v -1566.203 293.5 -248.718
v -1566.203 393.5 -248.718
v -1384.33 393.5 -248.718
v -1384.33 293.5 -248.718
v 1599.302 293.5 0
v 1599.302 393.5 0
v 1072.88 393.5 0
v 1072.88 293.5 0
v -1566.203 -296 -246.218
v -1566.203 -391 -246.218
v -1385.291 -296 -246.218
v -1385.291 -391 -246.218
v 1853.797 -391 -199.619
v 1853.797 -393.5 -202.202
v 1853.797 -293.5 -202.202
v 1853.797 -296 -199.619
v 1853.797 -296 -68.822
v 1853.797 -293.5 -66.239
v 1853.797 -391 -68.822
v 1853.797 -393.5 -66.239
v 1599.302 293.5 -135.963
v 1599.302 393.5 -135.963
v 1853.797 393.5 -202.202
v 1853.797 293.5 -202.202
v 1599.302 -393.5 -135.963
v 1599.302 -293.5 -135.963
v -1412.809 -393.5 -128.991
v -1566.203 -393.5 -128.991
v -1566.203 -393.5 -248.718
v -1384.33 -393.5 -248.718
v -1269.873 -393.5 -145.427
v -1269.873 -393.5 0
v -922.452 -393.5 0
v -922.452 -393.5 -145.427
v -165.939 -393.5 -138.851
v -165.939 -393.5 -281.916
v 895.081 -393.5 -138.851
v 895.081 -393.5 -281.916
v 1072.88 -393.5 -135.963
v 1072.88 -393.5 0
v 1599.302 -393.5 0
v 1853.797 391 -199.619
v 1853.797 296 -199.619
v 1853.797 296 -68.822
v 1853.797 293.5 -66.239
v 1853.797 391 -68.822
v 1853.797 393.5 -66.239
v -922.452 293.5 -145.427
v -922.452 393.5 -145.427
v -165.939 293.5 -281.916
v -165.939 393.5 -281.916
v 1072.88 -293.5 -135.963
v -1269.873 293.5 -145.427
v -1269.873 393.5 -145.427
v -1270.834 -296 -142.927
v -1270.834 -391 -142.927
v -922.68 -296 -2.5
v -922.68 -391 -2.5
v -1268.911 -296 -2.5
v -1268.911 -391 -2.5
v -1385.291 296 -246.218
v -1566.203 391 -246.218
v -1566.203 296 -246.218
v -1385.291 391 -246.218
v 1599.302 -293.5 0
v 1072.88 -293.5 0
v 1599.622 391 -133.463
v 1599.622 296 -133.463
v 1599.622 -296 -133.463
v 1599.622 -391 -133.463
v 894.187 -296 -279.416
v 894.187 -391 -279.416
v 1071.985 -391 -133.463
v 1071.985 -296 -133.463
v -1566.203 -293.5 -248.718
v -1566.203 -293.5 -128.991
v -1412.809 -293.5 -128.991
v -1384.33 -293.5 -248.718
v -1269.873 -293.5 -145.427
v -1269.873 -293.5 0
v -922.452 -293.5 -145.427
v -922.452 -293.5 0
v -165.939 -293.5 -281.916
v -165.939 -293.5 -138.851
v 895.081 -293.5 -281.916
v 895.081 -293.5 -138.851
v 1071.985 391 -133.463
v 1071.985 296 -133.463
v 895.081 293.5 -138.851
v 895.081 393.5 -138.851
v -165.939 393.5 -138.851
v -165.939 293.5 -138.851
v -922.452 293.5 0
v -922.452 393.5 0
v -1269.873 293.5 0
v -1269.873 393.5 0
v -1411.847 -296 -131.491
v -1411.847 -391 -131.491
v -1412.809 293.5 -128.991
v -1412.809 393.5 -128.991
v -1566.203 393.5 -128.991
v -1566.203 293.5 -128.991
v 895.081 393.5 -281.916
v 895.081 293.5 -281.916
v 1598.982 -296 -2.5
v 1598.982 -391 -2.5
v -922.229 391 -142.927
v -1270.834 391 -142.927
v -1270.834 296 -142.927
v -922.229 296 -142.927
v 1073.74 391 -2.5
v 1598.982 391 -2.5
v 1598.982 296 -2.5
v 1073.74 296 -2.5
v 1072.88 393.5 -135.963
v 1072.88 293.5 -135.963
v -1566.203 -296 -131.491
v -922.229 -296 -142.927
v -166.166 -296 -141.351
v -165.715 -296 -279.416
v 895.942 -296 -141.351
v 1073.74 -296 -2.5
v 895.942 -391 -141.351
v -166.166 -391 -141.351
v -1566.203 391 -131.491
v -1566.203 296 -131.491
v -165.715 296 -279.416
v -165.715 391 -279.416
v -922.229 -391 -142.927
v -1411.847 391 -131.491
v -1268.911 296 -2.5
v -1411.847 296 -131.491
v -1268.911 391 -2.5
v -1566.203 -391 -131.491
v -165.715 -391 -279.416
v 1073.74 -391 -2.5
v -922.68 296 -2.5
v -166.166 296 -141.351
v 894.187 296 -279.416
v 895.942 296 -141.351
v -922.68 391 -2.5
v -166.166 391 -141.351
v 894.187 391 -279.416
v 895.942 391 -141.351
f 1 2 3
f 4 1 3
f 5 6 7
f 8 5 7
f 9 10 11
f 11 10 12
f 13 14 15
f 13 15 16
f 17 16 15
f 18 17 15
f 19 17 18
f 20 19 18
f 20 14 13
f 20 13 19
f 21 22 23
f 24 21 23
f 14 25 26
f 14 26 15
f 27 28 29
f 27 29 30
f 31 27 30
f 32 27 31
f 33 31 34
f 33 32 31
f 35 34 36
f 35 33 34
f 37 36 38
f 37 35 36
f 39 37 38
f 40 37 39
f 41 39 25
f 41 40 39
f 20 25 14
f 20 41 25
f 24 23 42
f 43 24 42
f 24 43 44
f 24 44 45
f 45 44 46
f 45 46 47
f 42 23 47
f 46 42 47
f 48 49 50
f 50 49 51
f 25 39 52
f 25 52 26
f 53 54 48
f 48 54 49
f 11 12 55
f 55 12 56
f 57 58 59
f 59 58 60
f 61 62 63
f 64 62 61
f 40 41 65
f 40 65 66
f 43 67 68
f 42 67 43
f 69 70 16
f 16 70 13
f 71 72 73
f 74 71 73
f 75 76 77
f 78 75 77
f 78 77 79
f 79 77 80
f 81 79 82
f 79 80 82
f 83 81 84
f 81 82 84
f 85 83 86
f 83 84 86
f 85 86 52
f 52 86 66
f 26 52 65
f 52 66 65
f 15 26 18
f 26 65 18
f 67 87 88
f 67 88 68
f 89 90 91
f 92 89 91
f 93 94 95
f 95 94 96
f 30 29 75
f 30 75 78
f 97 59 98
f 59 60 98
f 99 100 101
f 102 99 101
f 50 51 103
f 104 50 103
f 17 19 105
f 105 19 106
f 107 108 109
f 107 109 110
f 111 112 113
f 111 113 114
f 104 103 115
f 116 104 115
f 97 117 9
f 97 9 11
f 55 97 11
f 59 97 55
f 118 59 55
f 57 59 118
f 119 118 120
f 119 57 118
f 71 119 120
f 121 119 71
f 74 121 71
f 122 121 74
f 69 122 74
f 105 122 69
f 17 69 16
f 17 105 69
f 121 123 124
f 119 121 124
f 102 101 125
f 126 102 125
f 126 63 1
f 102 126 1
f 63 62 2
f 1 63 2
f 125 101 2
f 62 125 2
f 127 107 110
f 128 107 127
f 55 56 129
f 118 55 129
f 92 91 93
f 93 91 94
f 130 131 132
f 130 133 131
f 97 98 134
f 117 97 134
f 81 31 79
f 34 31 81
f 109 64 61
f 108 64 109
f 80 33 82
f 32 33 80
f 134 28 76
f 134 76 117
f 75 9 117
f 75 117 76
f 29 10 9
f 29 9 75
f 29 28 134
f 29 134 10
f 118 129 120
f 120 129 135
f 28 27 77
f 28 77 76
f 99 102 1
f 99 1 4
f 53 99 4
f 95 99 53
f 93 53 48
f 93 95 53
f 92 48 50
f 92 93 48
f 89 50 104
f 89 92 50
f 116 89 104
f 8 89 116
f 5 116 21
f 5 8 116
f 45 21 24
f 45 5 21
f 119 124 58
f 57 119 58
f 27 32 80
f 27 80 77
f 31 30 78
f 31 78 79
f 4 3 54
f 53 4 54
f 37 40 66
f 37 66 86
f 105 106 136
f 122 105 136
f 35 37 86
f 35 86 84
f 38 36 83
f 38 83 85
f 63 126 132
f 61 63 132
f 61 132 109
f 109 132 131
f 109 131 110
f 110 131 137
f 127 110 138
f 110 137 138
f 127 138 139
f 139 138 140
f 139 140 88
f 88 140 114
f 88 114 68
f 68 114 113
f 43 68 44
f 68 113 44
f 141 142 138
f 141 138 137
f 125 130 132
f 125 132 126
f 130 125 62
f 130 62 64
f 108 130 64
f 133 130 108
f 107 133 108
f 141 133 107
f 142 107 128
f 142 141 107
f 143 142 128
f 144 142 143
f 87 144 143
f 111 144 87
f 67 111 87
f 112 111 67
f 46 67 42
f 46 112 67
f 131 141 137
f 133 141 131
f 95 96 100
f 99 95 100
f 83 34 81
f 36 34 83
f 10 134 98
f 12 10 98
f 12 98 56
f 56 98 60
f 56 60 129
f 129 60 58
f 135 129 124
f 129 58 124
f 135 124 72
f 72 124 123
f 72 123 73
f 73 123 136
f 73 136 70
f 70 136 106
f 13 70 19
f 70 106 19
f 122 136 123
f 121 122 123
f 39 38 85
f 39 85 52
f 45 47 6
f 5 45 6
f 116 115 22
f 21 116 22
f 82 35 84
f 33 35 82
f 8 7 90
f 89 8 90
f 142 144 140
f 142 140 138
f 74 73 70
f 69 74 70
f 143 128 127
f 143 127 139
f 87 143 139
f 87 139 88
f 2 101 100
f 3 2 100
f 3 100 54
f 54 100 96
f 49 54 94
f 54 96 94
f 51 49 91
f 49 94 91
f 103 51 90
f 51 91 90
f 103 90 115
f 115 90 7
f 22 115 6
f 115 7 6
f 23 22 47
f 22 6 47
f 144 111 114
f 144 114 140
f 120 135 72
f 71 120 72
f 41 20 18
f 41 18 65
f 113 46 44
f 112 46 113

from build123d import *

# Parameters (mm, degrees)
F2_DEPTH = 100
F3_T     = -2.5


with BuildPart() as f2:
    # F1 (on offset) → F2 (new body)
    with BuildSketch(Plane.XZ.offset(393.5)):
        Polygon((-1412.8086419196, -128.9908189169), (-1566.2030417423, -128.9908189169), (-1566.2030417423, -248.7181238432), (-1384.3301761846, -248.7181238432), (-1269.8727268362, -145.4273580902), (-922.4524051726, -145.4273580902), (-165.9386103739, -281.9161423003), (895.0813985169, -281.9161423003), (1072.8795650266, -135.9633091626), (1599.3015918366, -135.9633091626), (1853.7969582577, -202.2018350482), (1853.7969582577, -66.2385258856), (1599.3015918366, 0), (1072.8795650266, 0), (895.0813985169, -138.8513897236), (-165.9386103739, -138.8513897236), (-922.4524051726, 0), (-1269.8727268362, 0), align=None)
    extrude(amount=-F2_DEPTH)

    # F3
    f3_openings = [f2.faces().sort_by_distance(p)[0] for p in [
        (-1566.203042, -343.5, -188.854471),
        (1853.796958, -343.5, -134.22018),
    ]]
    offset(amount=F3_T, openings=f3_openings, kind=Kind.INTERSECTION)


with BuildPart() as f4_1:
    # F4: instance of F2
    add(f2.part.mirror(Plane.XZ))


solid = Compound([f2.part, f4_1.part])
